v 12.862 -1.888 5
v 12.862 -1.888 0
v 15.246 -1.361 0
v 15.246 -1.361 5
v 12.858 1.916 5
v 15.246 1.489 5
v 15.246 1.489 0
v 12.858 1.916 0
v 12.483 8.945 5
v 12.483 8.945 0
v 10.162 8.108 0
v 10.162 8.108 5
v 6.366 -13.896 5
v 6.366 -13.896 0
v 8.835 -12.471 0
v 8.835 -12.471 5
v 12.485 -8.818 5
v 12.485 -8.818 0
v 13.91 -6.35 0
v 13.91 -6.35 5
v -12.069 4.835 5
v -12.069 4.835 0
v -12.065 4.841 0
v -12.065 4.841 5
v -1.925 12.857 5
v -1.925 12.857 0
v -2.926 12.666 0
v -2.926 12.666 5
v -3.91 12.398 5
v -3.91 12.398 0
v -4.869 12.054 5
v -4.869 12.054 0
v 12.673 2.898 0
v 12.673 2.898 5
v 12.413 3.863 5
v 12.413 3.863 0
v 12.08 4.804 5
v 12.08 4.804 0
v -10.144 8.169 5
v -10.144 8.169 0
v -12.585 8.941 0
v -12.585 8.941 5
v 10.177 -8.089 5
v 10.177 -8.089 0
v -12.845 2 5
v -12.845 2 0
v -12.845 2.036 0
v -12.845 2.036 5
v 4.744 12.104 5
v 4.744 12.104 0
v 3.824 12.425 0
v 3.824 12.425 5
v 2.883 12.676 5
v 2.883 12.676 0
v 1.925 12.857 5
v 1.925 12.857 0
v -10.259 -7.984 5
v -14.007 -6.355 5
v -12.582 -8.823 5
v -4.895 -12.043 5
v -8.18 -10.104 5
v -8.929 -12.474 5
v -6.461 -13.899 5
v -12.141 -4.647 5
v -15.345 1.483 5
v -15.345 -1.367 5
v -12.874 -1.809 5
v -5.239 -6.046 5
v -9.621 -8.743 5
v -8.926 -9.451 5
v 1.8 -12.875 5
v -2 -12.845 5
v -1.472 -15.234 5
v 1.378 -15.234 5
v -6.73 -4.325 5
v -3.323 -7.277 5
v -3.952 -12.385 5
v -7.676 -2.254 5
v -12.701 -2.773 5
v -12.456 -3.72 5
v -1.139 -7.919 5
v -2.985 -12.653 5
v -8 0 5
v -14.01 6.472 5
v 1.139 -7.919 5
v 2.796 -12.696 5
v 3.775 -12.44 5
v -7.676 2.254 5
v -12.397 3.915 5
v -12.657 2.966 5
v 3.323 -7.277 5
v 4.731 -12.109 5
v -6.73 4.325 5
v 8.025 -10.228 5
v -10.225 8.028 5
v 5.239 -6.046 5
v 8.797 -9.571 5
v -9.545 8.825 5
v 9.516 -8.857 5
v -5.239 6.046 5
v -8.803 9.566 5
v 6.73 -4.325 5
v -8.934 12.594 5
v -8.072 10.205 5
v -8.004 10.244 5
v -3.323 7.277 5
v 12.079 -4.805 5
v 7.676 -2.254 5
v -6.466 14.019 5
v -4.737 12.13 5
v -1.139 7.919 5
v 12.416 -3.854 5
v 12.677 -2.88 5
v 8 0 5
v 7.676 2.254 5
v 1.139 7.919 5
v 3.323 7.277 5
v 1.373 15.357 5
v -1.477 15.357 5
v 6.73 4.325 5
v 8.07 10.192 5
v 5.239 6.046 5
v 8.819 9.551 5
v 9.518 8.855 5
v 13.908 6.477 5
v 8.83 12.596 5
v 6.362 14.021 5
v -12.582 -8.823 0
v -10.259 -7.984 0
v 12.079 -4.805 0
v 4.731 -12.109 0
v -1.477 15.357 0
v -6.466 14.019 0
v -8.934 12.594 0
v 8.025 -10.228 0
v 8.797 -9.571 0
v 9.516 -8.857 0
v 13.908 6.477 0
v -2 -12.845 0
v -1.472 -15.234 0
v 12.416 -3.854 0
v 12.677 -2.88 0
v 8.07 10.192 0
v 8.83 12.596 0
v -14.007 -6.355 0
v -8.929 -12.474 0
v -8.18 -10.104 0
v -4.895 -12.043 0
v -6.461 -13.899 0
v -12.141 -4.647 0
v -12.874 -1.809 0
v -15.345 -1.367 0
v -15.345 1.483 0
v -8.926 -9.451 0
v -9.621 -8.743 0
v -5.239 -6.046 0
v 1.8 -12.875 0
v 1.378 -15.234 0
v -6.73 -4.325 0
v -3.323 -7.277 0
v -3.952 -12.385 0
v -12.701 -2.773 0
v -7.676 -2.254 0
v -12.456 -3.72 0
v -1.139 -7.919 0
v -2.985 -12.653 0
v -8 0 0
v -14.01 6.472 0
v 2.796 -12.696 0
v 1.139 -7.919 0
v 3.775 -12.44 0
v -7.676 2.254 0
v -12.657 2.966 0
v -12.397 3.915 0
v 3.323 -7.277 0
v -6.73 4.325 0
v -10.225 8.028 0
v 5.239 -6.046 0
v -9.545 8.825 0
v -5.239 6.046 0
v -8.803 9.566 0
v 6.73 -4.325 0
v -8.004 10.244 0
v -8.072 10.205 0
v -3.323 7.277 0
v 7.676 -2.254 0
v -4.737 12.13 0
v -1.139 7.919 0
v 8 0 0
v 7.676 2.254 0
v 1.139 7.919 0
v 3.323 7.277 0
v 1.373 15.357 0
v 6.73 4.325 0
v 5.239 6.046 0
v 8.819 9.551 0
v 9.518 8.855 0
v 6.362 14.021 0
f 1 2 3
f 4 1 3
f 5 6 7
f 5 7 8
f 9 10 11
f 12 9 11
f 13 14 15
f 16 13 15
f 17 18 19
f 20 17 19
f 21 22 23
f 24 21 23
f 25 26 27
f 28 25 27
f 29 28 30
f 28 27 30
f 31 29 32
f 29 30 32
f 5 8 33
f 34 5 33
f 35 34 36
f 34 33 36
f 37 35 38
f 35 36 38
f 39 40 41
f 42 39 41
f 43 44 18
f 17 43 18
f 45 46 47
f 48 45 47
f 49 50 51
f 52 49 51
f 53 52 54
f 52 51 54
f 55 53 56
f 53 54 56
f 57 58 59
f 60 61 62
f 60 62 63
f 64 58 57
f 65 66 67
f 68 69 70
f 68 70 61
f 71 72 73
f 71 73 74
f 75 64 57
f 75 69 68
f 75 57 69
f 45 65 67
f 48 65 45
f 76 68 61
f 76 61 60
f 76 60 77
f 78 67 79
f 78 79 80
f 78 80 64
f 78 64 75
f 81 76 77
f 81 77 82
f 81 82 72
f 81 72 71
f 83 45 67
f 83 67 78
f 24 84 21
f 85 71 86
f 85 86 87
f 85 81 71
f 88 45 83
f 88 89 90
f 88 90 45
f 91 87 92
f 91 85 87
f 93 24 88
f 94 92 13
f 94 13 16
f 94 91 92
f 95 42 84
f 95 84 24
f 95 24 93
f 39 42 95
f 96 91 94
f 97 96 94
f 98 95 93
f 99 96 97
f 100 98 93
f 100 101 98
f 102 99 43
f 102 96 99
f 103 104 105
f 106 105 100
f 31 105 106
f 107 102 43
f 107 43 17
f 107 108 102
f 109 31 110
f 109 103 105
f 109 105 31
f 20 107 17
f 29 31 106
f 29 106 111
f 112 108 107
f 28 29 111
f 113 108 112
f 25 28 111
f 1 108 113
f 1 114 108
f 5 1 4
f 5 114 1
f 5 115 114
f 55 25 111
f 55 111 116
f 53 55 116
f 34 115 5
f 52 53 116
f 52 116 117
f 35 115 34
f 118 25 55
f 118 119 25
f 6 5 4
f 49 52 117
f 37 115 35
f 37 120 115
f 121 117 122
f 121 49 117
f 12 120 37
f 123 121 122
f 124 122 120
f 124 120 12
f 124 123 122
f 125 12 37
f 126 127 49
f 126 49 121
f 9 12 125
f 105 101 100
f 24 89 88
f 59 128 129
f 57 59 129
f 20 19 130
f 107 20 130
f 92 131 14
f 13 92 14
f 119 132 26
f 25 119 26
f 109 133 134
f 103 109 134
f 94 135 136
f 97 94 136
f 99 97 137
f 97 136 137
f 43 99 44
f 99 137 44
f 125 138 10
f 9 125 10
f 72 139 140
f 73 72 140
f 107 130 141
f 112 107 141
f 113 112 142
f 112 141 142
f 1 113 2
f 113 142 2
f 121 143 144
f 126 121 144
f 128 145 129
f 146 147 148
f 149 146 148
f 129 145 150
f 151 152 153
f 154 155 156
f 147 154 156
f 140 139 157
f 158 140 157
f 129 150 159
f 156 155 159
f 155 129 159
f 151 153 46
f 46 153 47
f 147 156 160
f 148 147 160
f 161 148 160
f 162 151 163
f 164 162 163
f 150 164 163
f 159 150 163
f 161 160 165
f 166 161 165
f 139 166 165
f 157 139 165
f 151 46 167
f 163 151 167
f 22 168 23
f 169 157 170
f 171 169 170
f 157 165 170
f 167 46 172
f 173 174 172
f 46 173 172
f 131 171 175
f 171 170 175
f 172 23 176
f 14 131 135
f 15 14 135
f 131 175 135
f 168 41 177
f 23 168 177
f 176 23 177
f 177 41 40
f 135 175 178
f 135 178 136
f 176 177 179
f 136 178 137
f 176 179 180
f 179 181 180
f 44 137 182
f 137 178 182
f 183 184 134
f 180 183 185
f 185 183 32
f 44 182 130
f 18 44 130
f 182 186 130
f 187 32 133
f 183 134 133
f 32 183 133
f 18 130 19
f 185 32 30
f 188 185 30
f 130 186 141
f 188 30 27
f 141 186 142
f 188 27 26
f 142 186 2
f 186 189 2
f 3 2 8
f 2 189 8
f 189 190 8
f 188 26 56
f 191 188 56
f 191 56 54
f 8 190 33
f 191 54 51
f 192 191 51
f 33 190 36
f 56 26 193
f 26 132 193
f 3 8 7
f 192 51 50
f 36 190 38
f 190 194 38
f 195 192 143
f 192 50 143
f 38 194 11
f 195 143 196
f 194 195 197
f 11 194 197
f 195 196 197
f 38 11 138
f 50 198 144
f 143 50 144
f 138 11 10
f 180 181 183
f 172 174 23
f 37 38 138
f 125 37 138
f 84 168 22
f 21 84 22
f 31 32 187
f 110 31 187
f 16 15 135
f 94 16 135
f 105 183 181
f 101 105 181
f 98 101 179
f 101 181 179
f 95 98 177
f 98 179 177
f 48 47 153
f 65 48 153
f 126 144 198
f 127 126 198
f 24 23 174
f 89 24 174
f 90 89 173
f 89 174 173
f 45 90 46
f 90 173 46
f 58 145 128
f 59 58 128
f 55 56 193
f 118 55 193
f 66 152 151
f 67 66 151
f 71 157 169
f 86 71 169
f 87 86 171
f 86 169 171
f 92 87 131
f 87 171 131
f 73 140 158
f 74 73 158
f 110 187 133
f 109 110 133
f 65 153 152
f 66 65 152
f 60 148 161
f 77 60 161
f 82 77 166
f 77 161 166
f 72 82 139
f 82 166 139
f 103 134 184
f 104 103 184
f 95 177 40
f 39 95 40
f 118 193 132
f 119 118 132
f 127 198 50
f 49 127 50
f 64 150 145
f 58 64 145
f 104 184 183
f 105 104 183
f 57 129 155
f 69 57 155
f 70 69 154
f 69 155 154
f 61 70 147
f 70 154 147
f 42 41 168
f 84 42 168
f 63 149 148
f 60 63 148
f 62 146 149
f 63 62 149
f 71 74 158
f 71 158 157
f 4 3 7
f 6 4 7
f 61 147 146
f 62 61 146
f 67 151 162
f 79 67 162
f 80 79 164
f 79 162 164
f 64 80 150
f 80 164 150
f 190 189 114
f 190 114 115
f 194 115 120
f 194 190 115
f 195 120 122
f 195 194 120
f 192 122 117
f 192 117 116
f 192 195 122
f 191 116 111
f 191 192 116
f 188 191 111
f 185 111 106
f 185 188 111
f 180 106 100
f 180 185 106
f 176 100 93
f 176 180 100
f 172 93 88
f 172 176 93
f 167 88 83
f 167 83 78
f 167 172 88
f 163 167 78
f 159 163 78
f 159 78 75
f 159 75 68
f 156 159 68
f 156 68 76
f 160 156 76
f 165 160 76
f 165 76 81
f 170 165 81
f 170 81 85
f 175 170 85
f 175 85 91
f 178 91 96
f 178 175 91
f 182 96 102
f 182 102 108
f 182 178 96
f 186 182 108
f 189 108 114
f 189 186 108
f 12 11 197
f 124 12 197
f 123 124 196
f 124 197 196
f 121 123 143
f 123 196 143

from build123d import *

# Parameters (mm, degrees)
F0_R     = 8
F1_DEPTH = 5


with BuildPart() as f1:
    # F0 (on Top) → F1 (new body)
    with BuildSketch(Plane.XY):
        with BuildLine():
            ThreePointArc((-8.0044057119, 10.2435096134), (-6.5, 11.2583302492), (-4.8689366932, 12.0537734954))
            Line((-4.8689366932, 12.0537734954), (-4.7373265178, 12.1297586656))
            Line((-4.7373265178, 12.1297586656), (-6.4657635443, 14.018596429))
            Line((-6.4657635443, 14.018596429), (-8.933935945, 12.593596429))
            Line((-8.933935945, 12.593596429), (-8.0715243224, 10.2047586656))
            Line((-8.0715243224, 10.2047586656), (-8.0044057119, 10.2435096134))
        make_face()
        with BuildLine():
            ThreePointArc((4.743830128, 12.1035563252), (3.3556109574, 12.5594536148), (1.925, 12.8566860038))
            Line((1.925, 12.8566860038), (-1.925, 12.8566860038))
            ThreePointArc((-1.925, 12.8566860038), (-3.4206082897, 12.5419073082), (-4.8689366932, 12.0537734954))
            Line((-4.8689366932, 12.0537734954), (-8.0044057119, 10.2435096134))
            ThreePointArc((-8.0044057119, 10.2435096134), (-9.18182436, 9.2029398249), (-10.2250960025, 8.0279145325))
            Line((-10.2250960025, 8.0279145325), (-12.0649259258, 4.841235628))
            ThreePointArc((-12.0649259258, 4.841235628), (-12.5358348008, 3.4427962251), (-12.8452325787, 2))
            Line((-12.8452325787, 2), (-12.8452325787, -1.8141498167))
            Line((-12.8452325787, -1.8141498167), (-12.8735077012, -1.8090880212))
            ThreePointArc((-12.8735077012, -1.8090880212), (-12.5874883323, -3.2488671079), (-12.1409769307, -4.6472227372))
            Line((-12.1409769307, -4.6472227372), (-12.1183052404, -4.6264763345))
            Line((-12.1183052404, -4.6264763345), (-10.1933052404, -7.9606741391))
            Line((-10.1933052404, -7.9606741391), (-10.2590920013, -7.9844242941))
            ThreePointArc((-10.2590920013, -7.9844242941), (-9.280273641, -9.1036542744), (-8.1800560603, -10.1037954675))
            Line((-8.1800560603, -10.1037954675), (-8.15760444, -10.0327566781))
            Line((-8.15760444, -10.0327566781), (-4.8234066354, -11.9577566781))
            Line((-4.8234066354, -11.9577566781), (-4.8953676956, -12.0430633613))
            ThreePointArc((-4.8953676956, -12.0430633613), (-3.470885444, -12.5280866151), (-1.9998974916, -12.8452485388))
            Line((-1.9998974916, -12.8452485388), (-2.0243967581, -12.7343823954))
            Line((-2.0243967581, -12.7343823954), (1.8256032419, -12.7343823954))
            Line((1.8256032419, -12.7343823954), (1.8004811118, -12.874714279))
            ThreePointArc((1.8004811118, -12.874714279), (3.2879257328, -12.5773425005), (4.730605508, -12.1087312105))
            Line((4.730605508, -12.1087312105), (4.6379297596, -12.0074550572))
            Line((4.6379297596, -12.0074550572), (7.9721275642, -10.0824550572))
            Line((7.9721275642, -10.0824550572), (8.0245708298, -10.2277203226))
            ThreePointArc((8.0245708298, -10.2277203226), (9.1634355916, -9.2212498154), (10.1770488861, -8.0887376006))
            Line((10.1770488861, -8.0887376006), (10.0442101032, -8.0467542567))
            Line((10.0442101032, -8.0467542567), (11.9692101032, -4.7125564521))
            Line((11.9692101032, -4.7125564521), (12.0792509027, -4.8053821522))
            ThreePointArc((12.0792509027, -4.8053821522), (12.555754306, -3.3694263322), (12.8621959896, -1.8878332353))
            Line((12.8621959896, -1.8878332353), (12.7458358205, -1.9135465749))
            Line((12.7458358205, -1.9135465749), (12.7458358205, 1.9364534251))
            Line((12.7458358205, 1.9364534251), (12.8579739202, 1.9163785295))
            ThreePointArc((12.8579739202, 1.9163785295), (12.5521491468, 3.3828319198), (12.0796545351, 4.8043674205))
            Line((12.0796545351, 4.8043674205), (12.0189084823, 4.7487799429))
            Line((12.0189084823, 4.7487799429), (10.0939084823, 8.0829777475))
            Line((10.0939084823, 8.0829777475), (10.1620468907, 8.1075768878))
            ThreePointArc((10.1620468907, 8.1075768878), (9.1753494128, 9.2093953739), (8.0698840464, 10.1920052727))
            Line((8.0698840464, 10.1920052727), (8.0582076818, 10.1550602865))
            Line((8.0582076818, 10.1550602865), (4.7240098772, 12.0800602865))
            Line((4.7240098772, 12.0800602865), (4.743830128, 12.1035563252))
        make_face()
        Circle(F0_R, mode=Mode.SUBTRACT)
        with BuildLine():
            ThreePointArc((-12.0649259258, 4.841235628), (-11.2583302492, 6.5), (-10.2250960025, 8.0279145325))
            Line((-10.2250960025, 8.0279145325), (-10.1436068614, 8.1690578651))
            Line((-10.1436068614, 8.1690578651), (-12.5848961169, 8.9406208386))
            Line((-12.5848961169, 8.9406208386), (-14.0098961169, 6.4724484378))
            Line((-14.0098961169, 6.4724484378), (-12.0686068614, 4.8348600605))
            Line((-12.0686068614, 4.8348600605), (-12.0649259258, 4.841235628))
        make_face()
        with BuildLine():
            ThreePointArc((-12.8735077012, -1.8090880212), (-12.9996418521, 0.096497236), (-12.8452325787, 2))
            Line((-12.8452325787, 2), (-12.8452325787, 2.0358501833))
            Line((-12.8452325787, 2.0358501833), (-15.3452325787, 1.4833986912))
            Line((-15.3452325787, 1.4833986912), (-15.3452325787, -1.3666013088))
            Line((-15.3452325787, -1.3666013088), (-12.8735077012, -1.8090880212))
        make_face()
        with BuildLine():
            ThreePointArc((-10.2590920013, -7.9844242941), (-11.3236478485, -6.3855304715), (-12.1409769307, -4.6472227372))
            Line((-12.1409769307, -4.6472227372), (-14.0071430039, -6.354913361))
            Line((-14.0071430039, -6.354913361), (-12.5821430039, -8.8230857618))
            Line((-12.5821430039, -8.8230857618), (-10.2590920013, -7.9844242941))
        make_face()
        with BuildLine():
            ThreePointArc((-4.8953676956, -12.0430633613), (-6.6092258692, -11.1945582052), (-8.1800560603, -10.1037954675))
            Line((-8.1800560603, -10.1037954675), (-8.9291674135, -12.4740459336))
            Line((-8.9291674135, -12.4740459336), (-6.4609950127, -13.8990459336))
            Line((-6.4609950127, -13.8990459336), (-4.8953676956, -12.0430633613))
        make_face()
        with BuildLine():
            ThreePointArc((1.8004811118, -12.874714279), (-0.1007907763, -12.9996092718), (-1.9998974916, -12.8452485388))
            Line((-1.9998974916, -12.8452485388), (-1.4719452661, -15.2343823954))
            Line((-1.4719452661, -15.2343823954), (1.3780547339, -15.2343823954))
            Line((1.3780547339, -15.2343823954), (1.8004811118, -12.874714279))
        make_face()
        with BuildLine():
            Line((8.8345391869, -12.4712928206), (8.0245708298, -10.2277203226))
            ThreePointArc((8.0245708298, -10.2277203226), (6.4465635297, -11.2890131835), (4.730605508, -12.1087312105))
            Line((4.730605508, -12.1087312105), (6.3663667861, -13.8962928206))
            Line((6.3663667861, -13.8962928206), (8.8345391869, -12.4712928206))
        make_face()
        with BuildLine():
            Line((13.9104993587, -6.3501448294), (12.0792509027, -4.8053821522))
            ThreePointArc((12.0792509027, -4.8053821522), (11.2485921707, -6.5168377437), (10.1770488861, -8.0887376006))
            Line((10.1770488861, -8.0887376006), (12.4854993587, -8.8183172302))
            Line((12.4854993587, -8.8183172302), (13.9104993587, -6.3501448294))
        make_face()
        with BuildLine():
            Line((15.2458358205, 1.4889049172), (12.8579739202, 1.9163785295))
            ThreePointArc((12.8579739202, 1.9163785295), (12.9644448582, 0.96081711), (13, 0))
            ThreePointArc((13, 0), (12.9655032271, -0.9464280571), (12.8621959896, -1.8878332353))
            Line((12.8621959896, -1.8878332353), (15.2458358205, -1.3610950828))
            Line((15.2458358205, -1.3610950828), (15.2458358205, 1.4889049172))
        make_face()
        with BuildLine():
            Line((6.3615982545, 14.021349542), (4.743830128, 12.1035563252))
            ThreePointArc((4.743830128, 12.1035563252), (6.4777561387, 11.2711434827), (8.0698840464, 10.1920052727))
            Line((8.0698840464, 10.1920052727), (8.8297706553, 12.596349542))
            Line((8.8297706553, 12.596349542), (6.3615982545, 14.021349542))
        make_face()
        with BuildLine():
            ThreePointArc((-1.925, 12.8566860038), (0, 13), (1.925, 12.8566860038))
            Line((1.925, 12.8566860038), (1.3725485079, 15.3566860038))
            Line((1.3725485079, 15.3566860038), (-1.4774514921, 15.3566860038))
            Line((-1.4774514921, 15.3566860038), (-1.925, 12.8566860038))
        make_face()
        with BuildLine():
            Line((12.4827462457, 8.9453893702), (10.1620468907, 8.1075768878))
            ThreePointArc((10.1620468907, 8.1075768878), (11.2428252132, 6.5267818429), (12.0796545351, 4.8043674205))
            Line((12.0796545351, 4.8043674205), (13.9077462457, 6.4772169694))
            Line((13.9077462457, 6.4772169694), (12.4827462457, 8.9453893702))
        make_face()
        with BuildLine():
            ThreePointArc((13, 0), (12.9644448582, 0.96081711), (12.8579739202, 1.9163785295))
            Line((12.8579739202, 1.9163785295), (12.7458358205, 1.9364534251))
            Line((12.7458358205, 1.9364534251), (12.7458358205, -1.9135465749))
            Line((12.7458358205, -1.9135465749), (12.8621959896, -1.8878332353))
            ThreePointArc((12.8621959896, -1.8878332353), (12.9655032271, -0.9464280571), (13, 0))
        make_face()
        with BuildLine():
            ThreePointArc((12.0796545351, 4.8043674205), (11.2428252132, 6.5267818429), (10.1620468907, 8.1075768878))
            Line((10.1620468907, 8.1075768878), (10.0939084823, 8.0829777475))
            Line((10.0939084823, 8.0829777475), (12.0189084823, 4.7487799429))
            Line((12.0189084823, 4.7487799429), (12.0796545351, 4.8043674205))
        make_face()
        with BuildLine():
            ThreePointArc((8.0698840464, 10.1920052727), (6.4777561387, 11.2711434827), (4.743830128, 12.1035563252))
            Line((4.743830128, 12.1035563252), (4.7240098772, 12.0800602865))
            Line((4.7240098772, 12.0800602865), (8.0582076818, 10.1550602865))
            Line((8.0582076818, 10.1550602865), (8.0698840464, 10.1920052727))
        make_face()
        with BuildLine():
            Line((-1.925, 12.8566860038), (1.925, 12.8566860038))
            ThreePointArc((1.925, 12.8566860038), (0, 13), (-1.925, 12.8566860038))
        make_face()
        with BuildLine():
            Line((-8.0044057119, 10.2435096134), (-4.8689366932, 12.0537734954))
            ThreePointArc((-4.8689366932, 12.0537734954), (-6.5, 11.2583302492), (-8.0044057119, 10.2435096134))
        make_face()
        with BuildLine():
            Line((-12.0649259258, 4.841235628), (-10.2250960025, 8.0279145325))
            ThreePointArc((-10.2250960025, 8.0279145325), (-11.2583302492, 6.5), (-12.0649259258, 4.841235628))
        make_face()
        with BuildLine():
            Line((-12.8452325787, -1.8141498167), (-12.8452325787, 2))
            ThreePointArc((-12.8452325787, 2), (-12.9996418521, 0.096497236), (-12.8735077012, -1.8090880212))
            Line((-12.8735077012, -1.8090880212), (-12.8452325787, -1.8141498167))
        make_face()
        with BuildLine():
            Line((-12.1183052404, -4.6264763345), (-12.1409769307, -4.6472227372))
            ThreePointArc((-12.1409769307, -4.6472227372), (-11.3236478485, -6.3855304715), (-10.2590920013, -7.9844242941))
            Line((-10.2590920013, -7.9844242941), (-10.1933052404, -7.9606741391))
            Line((-10.1933052404, -7.9606741391), (-12.1183052404, -4.6264763345))
        make_face()
        with BuildLine():
            Line((-8.15760444, -10.0327566781), (-8.1800560603, -10.1037954675))
            ThreePointArc((-8.1800560603, -10.1037954675), (-6.6092258692, -11.1945582052), (-4.8953676956, -12.0430633613))
            Line((-4.8953676956, -12.0430633613), (-4.8234066354, -11.9577566781))
            Line((-4.8234066354, -11.9577566781), (-8.15760444, -10.0327566781))
        make_face()
        with BuildLine():
            Line((-2.0243967581, -12.7343823954), (-1.9998974916, -12.8452485388))
            ThreePointArc((-1.9998974916, -12.8452485388), (-0.1007907763, -12.9996092718), (1.8004811118, -12.874714279))
            Line((1.8004811118, -12.874714279), (1.8256032419, -12.7343823954))
            Line((1.8256032419, -12.7343823954), (-2.0243967581, -12.7343823954))
        make_face()
        with BuildLine():
            ThreePointArc((4.730605508, -12.1087312105), (6.4465635297, -11.2890131835), (8.0245708298, -10.2277203226))
            Line((8.0245708298, -10.2277203226), (7.9721275642, -10.0824550572))
            Line((7.9721275642, -10.0824550572), (4.6379297596, -12.0074550572))
            Line((4.6379297596, -12.0074550572), (4.730605508, -12.1087312105))
        make_face()
        with BuildLine():
            ThreePointArc((10.1770488861, -8.0887376006), (11.2485921707, -6.5168377437), (12.0792509027, -4.8053821522))
            Line((12.0792509027, -4.8053821522), (11.9692101032, -4.7125564521))
            Line((11.9692101032, -4.7125564521), (10.0442101032, -8.0467542567))
            Line((10.0442101032, -8.0467542567), (10.1770488861, -8.0887376006))
        make_face()
    extrude(amount=F1_DEPTH)


solid = f1.part
